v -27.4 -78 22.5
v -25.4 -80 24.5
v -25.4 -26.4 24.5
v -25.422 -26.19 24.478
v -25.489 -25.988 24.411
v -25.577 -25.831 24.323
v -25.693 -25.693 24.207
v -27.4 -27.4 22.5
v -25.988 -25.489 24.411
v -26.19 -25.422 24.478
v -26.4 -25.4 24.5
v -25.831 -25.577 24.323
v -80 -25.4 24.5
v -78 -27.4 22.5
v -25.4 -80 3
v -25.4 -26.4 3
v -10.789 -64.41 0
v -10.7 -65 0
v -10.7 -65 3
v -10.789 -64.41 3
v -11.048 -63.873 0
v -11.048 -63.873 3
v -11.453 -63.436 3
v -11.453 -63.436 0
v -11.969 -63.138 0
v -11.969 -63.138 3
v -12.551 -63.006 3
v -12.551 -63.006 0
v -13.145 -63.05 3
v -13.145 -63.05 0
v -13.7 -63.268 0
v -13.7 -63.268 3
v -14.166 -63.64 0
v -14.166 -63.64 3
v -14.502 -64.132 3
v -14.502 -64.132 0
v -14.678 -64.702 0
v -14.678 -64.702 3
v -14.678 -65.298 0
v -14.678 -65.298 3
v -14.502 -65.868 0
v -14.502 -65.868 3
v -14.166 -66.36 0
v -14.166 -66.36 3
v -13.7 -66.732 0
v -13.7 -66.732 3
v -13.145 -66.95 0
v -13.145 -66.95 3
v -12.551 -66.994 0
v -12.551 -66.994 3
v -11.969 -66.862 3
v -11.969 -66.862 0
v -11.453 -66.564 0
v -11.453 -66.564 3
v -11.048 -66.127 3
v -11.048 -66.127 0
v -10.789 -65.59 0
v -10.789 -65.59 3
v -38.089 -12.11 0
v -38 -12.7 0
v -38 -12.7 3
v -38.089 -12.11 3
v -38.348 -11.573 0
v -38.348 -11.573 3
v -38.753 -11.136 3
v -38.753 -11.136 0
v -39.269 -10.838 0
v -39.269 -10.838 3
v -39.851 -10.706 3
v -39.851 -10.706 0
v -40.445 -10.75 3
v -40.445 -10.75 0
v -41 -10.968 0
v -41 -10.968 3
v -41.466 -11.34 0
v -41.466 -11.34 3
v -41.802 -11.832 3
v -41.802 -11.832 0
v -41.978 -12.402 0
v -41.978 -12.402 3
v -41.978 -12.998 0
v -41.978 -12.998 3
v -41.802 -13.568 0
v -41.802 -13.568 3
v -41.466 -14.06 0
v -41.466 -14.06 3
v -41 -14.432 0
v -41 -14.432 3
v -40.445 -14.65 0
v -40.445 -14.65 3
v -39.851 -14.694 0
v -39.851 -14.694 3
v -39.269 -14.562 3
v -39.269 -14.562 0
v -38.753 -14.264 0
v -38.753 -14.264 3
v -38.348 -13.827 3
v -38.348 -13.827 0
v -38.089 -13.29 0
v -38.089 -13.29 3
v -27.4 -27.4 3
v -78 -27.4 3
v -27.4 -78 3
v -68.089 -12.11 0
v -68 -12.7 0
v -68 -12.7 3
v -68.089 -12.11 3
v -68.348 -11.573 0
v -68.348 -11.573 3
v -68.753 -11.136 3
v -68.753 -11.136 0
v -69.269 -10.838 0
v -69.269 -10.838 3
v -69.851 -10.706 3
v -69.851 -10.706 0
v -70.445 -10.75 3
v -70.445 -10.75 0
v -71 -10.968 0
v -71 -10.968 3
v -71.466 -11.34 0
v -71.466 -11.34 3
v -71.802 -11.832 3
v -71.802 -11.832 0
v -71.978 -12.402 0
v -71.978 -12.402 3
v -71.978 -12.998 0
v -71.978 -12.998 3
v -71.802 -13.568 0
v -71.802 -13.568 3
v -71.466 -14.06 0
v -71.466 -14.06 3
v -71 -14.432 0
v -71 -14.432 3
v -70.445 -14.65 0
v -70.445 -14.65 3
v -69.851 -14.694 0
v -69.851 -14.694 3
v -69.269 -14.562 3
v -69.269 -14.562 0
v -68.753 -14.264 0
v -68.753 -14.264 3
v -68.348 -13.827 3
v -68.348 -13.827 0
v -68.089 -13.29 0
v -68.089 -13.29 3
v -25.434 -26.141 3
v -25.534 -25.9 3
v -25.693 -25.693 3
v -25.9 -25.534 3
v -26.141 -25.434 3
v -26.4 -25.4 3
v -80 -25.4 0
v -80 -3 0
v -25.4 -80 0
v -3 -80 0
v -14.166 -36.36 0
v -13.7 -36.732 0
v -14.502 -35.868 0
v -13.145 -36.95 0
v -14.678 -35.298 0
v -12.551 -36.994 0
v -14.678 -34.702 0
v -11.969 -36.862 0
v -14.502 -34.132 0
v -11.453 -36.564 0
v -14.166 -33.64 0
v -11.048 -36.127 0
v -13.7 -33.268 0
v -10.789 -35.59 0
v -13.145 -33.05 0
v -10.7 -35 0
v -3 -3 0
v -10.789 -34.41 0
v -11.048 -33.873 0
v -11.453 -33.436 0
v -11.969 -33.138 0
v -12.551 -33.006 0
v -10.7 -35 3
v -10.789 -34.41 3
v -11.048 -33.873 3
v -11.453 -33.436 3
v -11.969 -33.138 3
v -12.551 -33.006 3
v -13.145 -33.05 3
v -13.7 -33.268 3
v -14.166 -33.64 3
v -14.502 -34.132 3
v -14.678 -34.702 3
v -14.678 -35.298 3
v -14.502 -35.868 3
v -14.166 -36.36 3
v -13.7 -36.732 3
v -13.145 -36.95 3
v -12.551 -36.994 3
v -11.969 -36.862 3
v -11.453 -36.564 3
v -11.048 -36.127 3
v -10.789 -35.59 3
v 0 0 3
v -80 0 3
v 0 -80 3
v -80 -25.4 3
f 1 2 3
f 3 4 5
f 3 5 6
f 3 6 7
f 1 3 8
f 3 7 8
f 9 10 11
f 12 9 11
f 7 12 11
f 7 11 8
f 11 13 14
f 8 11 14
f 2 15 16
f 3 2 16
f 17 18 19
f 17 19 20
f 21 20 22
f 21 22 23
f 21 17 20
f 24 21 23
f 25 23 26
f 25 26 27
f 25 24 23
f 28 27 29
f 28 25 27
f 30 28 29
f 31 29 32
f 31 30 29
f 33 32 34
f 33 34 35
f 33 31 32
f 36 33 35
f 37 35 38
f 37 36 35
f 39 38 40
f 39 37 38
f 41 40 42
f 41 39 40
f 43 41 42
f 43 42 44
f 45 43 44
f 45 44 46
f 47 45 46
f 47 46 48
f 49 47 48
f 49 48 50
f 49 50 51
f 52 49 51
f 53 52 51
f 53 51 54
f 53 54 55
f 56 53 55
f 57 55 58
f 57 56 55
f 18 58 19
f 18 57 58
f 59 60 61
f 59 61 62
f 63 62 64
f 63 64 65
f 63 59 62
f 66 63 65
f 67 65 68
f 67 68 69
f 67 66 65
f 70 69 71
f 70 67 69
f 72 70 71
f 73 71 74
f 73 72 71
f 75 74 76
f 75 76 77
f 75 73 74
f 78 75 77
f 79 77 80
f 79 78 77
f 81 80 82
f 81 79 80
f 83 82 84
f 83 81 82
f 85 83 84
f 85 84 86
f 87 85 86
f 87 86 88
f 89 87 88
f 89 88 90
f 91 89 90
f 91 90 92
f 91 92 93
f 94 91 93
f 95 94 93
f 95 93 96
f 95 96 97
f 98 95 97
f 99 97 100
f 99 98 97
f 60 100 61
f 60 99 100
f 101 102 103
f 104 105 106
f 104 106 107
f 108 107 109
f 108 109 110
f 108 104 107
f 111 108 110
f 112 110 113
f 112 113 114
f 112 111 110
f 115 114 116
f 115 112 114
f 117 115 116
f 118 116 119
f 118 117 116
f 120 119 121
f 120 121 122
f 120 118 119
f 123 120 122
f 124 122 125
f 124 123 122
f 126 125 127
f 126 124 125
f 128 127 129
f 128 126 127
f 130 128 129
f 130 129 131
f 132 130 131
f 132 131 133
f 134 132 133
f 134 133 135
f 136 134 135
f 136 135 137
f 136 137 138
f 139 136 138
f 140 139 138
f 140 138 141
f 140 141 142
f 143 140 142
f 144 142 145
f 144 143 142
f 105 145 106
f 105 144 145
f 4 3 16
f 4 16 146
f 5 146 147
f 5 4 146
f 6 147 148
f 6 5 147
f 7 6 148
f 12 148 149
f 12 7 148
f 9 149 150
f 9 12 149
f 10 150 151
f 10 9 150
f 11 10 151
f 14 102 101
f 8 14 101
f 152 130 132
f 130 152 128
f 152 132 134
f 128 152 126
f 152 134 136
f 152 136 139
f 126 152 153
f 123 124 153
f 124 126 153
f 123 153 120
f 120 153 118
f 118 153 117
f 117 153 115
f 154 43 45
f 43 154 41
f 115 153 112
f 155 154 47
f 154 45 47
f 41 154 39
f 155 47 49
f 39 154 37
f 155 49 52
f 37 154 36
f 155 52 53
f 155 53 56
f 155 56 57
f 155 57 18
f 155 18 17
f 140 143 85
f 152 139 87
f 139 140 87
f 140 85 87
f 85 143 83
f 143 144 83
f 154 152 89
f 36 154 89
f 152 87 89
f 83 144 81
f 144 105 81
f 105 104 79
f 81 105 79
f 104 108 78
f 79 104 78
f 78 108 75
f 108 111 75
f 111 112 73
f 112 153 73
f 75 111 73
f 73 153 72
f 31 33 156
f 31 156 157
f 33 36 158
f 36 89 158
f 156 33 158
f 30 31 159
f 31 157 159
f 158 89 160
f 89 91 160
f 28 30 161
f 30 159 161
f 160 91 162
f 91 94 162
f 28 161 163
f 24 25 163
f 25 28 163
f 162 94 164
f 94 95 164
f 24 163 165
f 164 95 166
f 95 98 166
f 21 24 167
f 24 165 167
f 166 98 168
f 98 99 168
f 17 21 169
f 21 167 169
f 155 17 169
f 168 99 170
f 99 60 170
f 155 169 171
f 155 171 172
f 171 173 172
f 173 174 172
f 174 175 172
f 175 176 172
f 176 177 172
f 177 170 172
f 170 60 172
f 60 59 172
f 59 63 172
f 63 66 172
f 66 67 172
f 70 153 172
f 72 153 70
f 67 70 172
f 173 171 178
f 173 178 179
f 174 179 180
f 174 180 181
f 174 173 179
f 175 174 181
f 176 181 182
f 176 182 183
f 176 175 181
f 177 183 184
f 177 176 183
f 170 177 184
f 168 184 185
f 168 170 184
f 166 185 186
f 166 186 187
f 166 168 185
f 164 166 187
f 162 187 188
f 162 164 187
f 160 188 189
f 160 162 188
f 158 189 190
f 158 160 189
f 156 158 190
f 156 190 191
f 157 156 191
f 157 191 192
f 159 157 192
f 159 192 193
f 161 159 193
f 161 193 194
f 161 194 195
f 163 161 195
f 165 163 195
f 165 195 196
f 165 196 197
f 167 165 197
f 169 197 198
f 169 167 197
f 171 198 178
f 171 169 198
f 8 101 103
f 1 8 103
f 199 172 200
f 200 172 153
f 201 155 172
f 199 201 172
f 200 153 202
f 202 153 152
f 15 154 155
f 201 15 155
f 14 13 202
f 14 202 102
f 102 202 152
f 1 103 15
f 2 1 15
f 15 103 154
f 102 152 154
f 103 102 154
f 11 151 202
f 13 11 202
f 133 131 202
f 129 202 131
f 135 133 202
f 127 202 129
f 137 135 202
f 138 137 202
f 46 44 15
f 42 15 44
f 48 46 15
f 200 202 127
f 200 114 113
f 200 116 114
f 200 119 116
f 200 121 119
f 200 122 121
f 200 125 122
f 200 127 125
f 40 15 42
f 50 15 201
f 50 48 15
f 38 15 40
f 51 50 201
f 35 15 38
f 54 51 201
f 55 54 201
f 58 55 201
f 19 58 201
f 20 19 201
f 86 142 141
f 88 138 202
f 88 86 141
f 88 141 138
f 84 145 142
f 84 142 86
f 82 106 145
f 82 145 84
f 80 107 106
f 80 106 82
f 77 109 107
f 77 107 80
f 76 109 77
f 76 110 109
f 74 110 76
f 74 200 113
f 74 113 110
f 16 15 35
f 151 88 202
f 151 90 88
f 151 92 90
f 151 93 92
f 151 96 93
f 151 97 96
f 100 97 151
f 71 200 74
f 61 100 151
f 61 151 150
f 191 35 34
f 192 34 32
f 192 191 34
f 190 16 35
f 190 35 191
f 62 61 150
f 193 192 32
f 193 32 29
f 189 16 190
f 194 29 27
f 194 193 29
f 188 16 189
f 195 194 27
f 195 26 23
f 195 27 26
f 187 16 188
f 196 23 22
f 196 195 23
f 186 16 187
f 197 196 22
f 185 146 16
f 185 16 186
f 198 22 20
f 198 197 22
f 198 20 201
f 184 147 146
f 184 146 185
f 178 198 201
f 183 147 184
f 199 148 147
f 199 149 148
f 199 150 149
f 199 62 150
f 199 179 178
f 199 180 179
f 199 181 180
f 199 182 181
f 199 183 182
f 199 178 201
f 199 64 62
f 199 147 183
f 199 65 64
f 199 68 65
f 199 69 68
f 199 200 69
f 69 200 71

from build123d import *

# Parameters (mm, degrees)
F0_R        = 2
F1_DEPTH    = 3
F3_DEPTH    = 21.5
F4_SIZE     = 2.99999
F5_R        = 1
F6_T4_DEPTH = 60.8867319519
F6_T9_DEPTH = 60.8867319519


# Not quite as in the source:
# - a fillet or chamfer that OpenCascade refuses, or shapes differently, is made with other operations: its cross-section is extruded or revolved along the edge and cut away or added
# - a fillet or chamfer is up to 0.001 mm smaller than in the source, because OpenCascade refuses the exact size


with BuildPart() as f1:
    # F0 (on Top) → F1 (new body)
    with BuildSketch(Plane.XY):
        Polygon((0, -80), (0, 0), (-80, 0), (-80, -25.4), (-25.4, -80), align=None)
        with Locations((-12.7, -65)):
            Circle(F0_R, mode=Mode.SUBTRACT)
        with Locations((-70, -12.7)):
            Circle(F0_R, mode=Mode.SUBTRACT)
        with Locations((-12.7, -35)):
            Circle(F0_R, mode=Mode.SUBTRACT)
        with Locations((-40, -12.7)):
            Circle(F0_R, mode=Mode.SUBTRACT)
    extrude(amount=F1_DEPTH)

    # F2 (on face) → F3 (join)
    with BuildSketch(Plane.XY.offset(3)):
        Polygon((-25.4, -25.4), (-80, -25.4), (-78, -27.4), (-27.4, -27.4), (-27.4, -78), (-25.4, -80), align=None)
    extrude(amount=F3_DEPTH)

    # F4 (size 3 in the source; OpenCascade refuses exactly that, so slightly less here)
    f4_edges = [f1.edges().sort_by_distance(p)[0] for p in [
        (-40, 0, 0),
        (0, -40, 0),
    ]]
    chamfer(f4_edges, length=F4_SIZE)

    # F5
    f5_edges = [f1.edges().sort_by_distance(p)[0] for p in [
        (-25.4, -25.4, 13.75),
    ]]
    fillet(f5_edges, radius=F5_R)

    # F6: chamfer of 2 on 2 edges, made by hand


with BuildPart() as f6_tool2:
    # F6_s3 → F6_t4 (new body)
    with BuildSketch(Plane.YZ.offset(-83.1433659759)):
        Polygon((-25.4, 24.5), (-27.4, 22.5), (-27.4, 24.5), align=None)
    extrude(amount=F6_T4_DEPTH)

    split(bisect_by=Plane(origin=(-24.95, 0, 24.95), x_dir=(0, 1, 0), z_dir=(-0.7071067812, 0, 0.7071067812)), keep=Keep.TOP)


with BuildPart() as f1_1:
    add(f1.part)

    # F6_t1: cut F6_tool2
    add(f6_tool2.part, mode=Mode.SUBTRACT)


with BuildPart() as f6_tool7:
    # F6_s8 → F6_t9 (new body)
    with BuildSketch(Plane.XZ.offset(22.2566340241)):
        Polygon((-25.4, 24.5), (-27.4, 22.5), (-27.4, 24.5), align=None)
    extrude(amount=F6_T9_DEPTH)

    split(bisect_by=Plane(origin=(0, -24.95, 24.95), x_dir=(1, 0, 0), z_dir=(0, -0.7071067812, 0.7071067812)), keep=Keep.TOP)


with BuildPart() as f1_2:
    add(f1_1.part)

    # F6_t6: cut F6_tool7
    add(f6_tool7.part, mode=Mode.SUBTRACT)


solid = f1_2.part
